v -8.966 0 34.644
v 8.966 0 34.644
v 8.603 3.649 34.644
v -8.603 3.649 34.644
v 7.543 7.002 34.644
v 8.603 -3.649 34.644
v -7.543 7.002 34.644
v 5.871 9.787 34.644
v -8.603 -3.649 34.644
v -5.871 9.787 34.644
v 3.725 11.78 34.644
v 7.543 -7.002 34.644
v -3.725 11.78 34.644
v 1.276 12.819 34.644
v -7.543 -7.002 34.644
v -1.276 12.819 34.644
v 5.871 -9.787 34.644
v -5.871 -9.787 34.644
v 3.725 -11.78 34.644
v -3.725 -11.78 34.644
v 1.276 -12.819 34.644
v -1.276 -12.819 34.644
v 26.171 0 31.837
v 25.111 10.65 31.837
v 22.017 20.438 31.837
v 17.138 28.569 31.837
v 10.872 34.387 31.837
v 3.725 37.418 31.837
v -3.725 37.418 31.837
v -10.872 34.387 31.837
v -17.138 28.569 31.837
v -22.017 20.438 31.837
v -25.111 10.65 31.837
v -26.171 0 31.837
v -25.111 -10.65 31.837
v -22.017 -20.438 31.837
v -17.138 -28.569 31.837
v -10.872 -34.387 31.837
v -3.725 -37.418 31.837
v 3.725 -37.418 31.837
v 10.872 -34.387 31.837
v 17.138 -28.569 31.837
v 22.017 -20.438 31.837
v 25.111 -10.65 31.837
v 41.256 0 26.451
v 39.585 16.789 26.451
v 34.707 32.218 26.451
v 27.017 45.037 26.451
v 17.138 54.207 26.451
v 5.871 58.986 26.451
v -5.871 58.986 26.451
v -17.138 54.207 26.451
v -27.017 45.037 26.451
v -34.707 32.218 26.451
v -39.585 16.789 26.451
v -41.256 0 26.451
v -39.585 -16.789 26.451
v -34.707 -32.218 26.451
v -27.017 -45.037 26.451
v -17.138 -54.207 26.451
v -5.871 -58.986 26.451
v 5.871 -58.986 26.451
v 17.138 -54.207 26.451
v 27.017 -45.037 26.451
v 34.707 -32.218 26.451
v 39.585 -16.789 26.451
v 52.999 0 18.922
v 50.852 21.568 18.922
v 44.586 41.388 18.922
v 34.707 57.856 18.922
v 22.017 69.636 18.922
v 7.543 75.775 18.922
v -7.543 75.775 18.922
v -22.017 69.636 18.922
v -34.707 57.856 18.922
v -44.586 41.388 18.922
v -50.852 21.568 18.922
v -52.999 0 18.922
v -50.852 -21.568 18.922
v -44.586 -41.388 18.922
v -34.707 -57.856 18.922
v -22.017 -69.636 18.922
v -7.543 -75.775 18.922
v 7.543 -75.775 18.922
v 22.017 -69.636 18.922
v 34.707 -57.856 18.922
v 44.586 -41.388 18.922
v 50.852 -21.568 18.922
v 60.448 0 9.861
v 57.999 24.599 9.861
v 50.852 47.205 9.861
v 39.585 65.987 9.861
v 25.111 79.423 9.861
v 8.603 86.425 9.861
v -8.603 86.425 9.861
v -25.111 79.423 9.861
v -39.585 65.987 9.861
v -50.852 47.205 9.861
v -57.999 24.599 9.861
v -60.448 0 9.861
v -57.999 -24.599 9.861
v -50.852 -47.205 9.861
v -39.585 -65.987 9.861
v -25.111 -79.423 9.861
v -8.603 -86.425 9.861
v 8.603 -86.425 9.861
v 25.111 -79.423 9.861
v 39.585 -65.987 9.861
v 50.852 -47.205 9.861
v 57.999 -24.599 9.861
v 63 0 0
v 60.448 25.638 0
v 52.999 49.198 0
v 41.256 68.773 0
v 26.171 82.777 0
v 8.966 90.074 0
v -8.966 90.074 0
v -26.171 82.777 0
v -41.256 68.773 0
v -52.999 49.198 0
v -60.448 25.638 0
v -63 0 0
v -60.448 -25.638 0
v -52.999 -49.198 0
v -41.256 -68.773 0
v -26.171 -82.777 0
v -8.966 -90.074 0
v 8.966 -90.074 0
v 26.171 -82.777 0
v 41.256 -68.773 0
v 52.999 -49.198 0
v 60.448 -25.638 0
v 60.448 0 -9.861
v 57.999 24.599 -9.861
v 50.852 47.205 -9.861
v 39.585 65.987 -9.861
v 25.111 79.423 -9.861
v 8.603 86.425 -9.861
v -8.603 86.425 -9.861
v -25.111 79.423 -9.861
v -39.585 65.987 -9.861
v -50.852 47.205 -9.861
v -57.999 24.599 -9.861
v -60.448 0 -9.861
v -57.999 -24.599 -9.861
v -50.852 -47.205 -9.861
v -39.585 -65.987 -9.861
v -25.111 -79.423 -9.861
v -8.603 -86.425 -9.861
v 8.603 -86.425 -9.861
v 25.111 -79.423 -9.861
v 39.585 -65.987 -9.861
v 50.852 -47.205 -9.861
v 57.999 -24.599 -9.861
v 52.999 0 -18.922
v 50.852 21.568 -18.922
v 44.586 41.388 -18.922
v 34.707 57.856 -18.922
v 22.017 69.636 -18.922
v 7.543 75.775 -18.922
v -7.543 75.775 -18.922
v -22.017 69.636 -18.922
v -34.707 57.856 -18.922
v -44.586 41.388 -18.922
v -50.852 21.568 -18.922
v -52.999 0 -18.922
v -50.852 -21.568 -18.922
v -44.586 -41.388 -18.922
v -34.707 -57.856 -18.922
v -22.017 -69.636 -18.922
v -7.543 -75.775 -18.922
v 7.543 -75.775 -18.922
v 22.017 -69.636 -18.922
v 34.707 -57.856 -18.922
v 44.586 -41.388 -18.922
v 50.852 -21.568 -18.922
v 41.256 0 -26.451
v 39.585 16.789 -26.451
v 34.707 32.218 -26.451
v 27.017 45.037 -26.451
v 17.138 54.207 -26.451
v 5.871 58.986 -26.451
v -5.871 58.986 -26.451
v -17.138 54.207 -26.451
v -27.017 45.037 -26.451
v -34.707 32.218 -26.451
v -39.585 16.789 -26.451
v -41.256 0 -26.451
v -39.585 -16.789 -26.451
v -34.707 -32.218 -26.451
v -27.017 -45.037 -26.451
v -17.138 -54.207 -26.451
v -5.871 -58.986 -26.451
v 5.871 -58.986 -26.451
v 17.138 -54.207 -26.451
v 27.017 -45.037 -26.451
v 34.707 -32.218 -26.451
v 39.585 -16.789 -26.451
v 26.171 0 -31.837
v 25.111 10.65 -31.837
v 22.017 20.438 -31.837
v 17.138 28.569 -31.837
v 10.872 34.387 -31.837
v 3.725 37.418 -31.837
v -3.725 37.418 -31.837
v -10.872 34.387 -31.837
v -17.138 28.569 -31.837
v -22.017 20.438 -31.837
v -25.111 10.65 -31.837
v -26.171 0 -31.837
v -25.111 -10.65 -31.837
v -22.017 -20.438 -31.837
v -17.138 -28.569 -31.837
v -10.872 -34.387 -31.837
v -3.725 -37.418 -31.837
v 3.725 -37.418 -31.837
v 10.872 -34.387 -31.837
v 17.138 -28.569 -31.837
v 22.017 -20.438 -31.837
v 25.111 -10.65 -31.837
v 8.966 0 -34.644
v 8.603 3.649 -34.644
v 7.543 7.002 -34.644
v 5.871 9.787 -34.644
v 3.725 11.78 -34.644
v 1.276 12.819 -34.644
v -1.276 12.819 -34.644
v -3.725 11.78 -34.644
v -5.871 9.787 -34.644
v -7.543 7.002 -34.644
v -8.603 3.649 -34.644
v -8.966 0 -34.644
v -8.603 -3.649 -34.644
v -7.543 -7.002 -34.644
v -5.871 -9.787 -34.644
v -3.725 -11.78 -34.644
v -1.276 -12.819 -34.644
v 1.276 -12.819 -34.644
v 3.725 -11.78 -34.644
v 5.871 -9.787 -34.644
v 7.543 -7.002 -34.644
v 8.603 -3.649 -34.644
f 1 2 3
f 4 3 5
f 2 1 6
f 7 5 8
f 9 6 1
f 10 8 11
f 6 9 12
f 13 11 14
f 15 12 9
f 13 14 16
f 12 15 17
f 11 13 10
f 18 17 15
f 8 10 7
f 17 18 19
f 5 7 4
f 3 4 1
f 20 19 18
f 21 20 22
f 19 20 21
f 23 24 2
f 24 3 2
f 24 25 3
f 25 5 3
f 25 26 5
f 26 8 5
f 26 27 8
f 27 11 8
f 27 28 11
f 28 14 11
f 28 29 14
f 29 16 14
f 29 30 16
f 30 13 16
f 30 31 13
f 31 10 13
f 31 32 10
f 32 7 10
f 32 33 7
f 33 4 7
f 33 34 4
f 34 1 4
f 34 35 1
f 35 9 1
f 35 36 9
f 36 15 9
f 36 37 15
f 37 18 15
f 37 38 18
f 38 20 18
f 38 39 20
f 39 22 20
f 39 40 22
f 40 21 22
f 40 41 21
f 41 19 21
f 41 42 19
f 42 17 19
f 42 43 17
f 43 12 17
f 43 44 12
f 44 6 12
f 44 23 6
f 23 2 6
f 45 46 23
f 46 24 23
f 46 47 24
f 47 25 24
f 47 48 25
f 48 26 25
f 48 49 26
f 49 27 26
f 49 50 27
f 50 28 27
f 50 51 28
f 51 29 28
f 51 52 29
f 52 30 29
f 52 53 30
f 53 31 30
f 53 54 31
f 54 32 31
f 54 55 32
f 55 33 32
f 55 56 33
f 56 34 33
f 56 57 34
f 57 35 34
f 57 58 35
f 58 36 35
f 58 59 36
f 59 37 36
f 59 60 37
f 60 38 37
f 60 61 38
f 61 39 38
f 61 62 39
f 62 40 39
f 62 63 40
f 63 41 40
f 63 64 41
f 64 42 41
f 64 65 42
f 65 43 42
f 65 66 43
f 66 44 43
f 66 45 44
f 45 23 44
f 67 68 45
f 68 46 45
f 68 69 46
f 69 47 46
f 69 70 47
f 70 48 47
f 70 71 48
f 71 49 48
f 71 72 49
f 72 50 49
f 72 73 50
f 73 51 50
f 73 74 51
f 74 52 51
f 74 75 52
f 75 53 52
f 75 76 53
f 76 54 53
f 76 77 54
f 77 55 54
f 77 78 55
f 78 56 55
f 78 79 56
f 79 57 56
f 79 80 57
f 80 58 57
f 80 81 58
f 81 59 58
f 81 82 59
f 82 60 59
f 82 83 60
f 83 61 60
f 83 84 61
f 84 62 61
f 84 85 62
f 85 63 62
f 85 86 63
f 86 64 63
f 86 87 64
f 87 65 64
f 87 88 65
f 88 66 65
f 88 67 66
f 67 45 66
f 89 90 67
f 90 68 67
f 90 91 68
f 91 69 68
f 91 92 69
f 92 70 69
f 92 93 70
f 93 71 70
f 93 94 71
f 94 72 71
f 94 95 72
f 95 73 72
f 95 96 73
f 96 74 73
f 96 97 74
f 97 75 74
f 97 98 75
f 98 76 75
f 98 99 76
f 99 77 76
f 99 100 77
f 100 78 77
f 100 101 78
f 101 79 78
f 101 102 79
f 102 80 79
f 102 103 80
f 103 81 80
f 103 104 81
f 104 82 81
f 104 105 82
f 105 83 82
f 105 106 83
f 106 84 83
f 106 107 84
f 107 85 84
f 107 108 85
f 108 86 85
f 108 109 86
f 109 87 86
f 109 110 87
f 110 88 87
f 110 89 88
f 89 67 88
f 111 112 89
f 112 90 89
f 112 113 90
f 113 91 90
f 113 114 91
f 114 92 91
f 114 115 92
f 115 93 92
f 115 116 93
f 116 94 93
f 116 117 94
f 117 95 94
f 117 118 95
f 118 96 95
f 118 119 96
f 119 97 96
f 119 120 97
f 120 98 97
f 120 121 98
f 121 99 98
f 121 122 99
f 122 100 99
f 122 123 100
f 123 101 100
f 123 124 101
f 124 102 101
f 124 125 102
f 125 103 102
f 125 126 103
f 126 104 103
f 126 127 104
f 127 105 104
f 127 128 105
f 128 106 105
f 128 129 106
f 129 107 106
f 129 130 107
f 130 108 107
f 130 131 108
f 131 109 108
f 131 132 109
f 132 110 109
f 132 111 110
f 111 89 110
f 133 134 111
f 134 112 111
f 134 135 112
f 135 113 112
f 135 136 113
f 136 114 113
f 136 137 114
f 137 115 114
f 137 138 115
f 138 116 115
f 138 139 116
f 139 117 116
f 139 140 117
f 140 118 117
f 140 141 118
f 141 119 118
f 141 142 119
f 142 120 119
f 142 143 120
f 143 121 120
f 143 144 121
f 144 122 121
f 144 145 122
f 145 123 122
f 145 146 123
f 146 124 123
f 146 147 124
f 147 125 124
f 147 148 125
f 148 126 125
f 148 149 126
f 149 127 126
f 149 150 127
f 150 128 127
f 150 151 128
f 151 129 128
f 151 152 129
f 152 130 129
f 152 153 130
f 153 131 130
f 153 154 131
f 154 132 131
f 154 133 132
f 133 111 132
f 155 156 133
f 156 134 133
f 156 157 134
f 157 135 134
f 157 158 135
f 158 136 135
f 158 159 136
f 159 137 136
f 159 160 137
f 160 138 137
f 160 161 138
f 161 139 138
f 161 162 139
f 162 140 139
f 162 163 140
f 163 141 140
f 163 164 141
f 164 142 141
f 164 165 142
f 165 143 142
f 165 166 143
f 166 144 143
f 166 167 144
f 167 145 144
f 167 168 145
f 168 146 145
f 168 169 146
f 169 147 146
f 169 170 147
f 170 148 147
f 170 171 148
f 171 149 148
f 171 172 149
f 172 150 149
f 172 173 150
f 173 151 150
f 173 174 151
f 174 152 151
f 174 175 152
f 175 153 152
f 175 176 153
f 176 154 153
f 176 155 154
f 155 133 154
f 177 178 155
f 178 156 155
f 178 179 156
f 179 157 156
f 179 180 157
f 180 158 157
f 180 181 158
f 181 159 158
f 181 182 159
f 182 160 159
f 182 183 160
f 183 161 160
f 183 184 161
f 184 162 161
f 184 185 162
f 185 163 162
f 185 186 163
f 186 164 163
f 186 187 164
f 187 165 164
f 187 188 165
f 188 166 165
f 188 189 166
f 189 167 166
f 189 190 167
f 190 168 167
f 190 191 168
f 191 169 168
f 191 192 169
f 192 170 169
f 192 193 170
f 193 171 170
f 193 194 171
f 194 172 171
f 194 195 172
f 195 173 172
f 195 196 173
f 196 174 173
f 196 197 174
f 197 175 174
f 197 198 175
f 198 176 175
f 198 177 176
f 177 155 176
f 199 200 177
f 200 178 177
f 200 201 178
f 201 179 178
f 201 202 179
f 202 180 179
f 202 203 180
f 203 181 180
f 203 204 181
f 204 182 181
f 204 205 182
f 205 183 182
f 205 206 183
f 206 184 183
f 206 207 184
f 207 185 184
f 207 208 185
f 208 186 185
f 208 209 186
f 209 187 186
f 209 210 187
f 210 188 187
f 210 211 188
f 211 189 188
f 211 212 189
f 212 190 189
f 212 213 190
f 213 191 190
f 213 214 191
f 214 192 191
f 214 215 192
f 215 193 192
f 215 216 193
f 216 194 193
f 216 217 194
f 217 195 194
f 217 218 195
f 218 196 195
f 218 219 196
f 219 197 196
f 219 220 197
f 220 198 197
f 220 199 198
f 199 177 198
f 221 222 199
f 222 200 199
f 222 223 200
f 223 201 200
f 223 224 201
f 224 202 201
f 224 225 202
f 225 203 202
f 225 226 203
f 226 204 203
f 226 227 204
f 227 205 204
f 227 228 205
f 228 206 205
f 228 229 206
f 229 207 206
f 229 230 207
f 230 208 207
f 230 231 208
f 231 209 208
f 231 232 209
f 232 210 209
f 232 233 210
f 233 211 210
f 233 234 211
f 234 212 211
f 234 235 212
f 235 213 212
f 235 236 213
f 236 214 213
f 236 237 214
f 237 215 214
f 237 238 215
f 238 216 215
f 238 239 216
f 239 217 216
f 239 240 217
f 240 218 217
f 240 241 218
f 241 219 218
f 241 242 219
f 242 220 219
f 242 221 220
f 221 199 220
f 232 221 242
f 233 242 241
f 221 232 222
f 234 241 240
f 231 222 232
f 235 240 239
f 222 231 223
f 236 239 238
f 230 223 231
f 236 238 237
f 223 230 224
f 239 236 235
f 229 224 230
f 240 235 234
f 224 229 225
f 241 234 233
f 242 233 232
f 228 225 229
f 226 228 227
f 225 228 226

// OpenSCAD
// Generated by SolidPython 1.0.1 on 2020-07-29 00:46:48


scale(v = [9, 13, 5]) {
	sphere(r = 7);
}
/***********************************************
*********      SolidPython code:      **********
************************************************
 
# import packages: SolidPython
from solid import *
from solid.utils import *
from itertools import chain, combinations, permutations


class Resize:

    def __init__(self, scad_file):
        self.scad_file = scad_file
        #self.scad_file = import_scad(scad_file)
        # cone/cylinder param:
        self.r1 = 0
        self.r2 = 0
        self.h = 0
        # rectangular prism param:
        self.w = 0
        self.l = 0
        # ellipse param:
        self.r = 0

    # import OpenScad code (file name corresponds to shape)


    # classify shape + parameters
    def assign(self, param1, param2, param3):
        if self.scad_file == 'cone.scad':
            self.r1 = param1
            self.r2 = param2
            self.h = param3
        elif self.scad_file == 'cylinder.scad':
            self.r1 = param1
            self.r2 = param2
            self.h = param3
        elif self.scad_file == 'rectangularPrism.scad':
            self.h = param1
            self.l = param2
            self.w = param3
        else:
            self.r = param1
            self.h = param2

    # resize parameters
    def iterate(self):
        x = range(3, 20, 2)
        i = 1
        if self.scad_file == 'cone.scad':
            tempList = list(permutations(x, 2))
            for temp in tempList:
                param1 = temp[0]
                param2 = temp[1]
                filepath = 'produced_scad_files/' + 'cone' + str(param1) + '_' + str(param2) + '_' + '.scad'
                scad_render_to_file(cylinder(h=param1, r1=param2, r2=0), filepath)

        elif self.scad_file == 'cylinder.scad':
            tempList = list(permutations(x, 3))
            for temp in tempList:
                param1 = temp[0]
                param2 = temp[1]
                filepath = 'produced_scad_files/' + 'cylinder' + str(param1) + '_' + str(param2) + '_' + '.scad'
                scad_render_to_file(cylinder(h=param1, r1=param2, r2=param2), filepath)

        elif self.scad_file == 'rectangularPrism.scad':
            tempList = list(permutations(x, 3))
            for temp in tempList:
                param1 = temp[0]
                param2 = temp[1]
                param3 = temp[2]
                filepath = 'produced_scad_files/' + 'rectangularPrism' + str(param1) + '_' + str(param2) + '_' + str(
                    param3) + '.scad'
                scad_render_to_file(cube(size=(param1, param2, param3)), filepath)

        elif self.scad_file == 'ellipse.scad':
            tempList = list(permutations(x, 4))
            for temp in tempList:
                param1 = temp[0]
                param2 = temp[1]
                param3 = temp[2]
                param4 = temp[3]
                filepath = 'produced_scad_files/' + 'ellipse' + str(param1) + '_' + str(param2) + '_' + str(param3) + '_' + str(param4) + '.scad'
                scad_render_to_file(scale([param1, param2, param3])(sphere(r=param4)), filepath)

    def render_to_scadfile(self):
        scad_render_to_file(scad, 'example.scad') 
 
************************************************/
